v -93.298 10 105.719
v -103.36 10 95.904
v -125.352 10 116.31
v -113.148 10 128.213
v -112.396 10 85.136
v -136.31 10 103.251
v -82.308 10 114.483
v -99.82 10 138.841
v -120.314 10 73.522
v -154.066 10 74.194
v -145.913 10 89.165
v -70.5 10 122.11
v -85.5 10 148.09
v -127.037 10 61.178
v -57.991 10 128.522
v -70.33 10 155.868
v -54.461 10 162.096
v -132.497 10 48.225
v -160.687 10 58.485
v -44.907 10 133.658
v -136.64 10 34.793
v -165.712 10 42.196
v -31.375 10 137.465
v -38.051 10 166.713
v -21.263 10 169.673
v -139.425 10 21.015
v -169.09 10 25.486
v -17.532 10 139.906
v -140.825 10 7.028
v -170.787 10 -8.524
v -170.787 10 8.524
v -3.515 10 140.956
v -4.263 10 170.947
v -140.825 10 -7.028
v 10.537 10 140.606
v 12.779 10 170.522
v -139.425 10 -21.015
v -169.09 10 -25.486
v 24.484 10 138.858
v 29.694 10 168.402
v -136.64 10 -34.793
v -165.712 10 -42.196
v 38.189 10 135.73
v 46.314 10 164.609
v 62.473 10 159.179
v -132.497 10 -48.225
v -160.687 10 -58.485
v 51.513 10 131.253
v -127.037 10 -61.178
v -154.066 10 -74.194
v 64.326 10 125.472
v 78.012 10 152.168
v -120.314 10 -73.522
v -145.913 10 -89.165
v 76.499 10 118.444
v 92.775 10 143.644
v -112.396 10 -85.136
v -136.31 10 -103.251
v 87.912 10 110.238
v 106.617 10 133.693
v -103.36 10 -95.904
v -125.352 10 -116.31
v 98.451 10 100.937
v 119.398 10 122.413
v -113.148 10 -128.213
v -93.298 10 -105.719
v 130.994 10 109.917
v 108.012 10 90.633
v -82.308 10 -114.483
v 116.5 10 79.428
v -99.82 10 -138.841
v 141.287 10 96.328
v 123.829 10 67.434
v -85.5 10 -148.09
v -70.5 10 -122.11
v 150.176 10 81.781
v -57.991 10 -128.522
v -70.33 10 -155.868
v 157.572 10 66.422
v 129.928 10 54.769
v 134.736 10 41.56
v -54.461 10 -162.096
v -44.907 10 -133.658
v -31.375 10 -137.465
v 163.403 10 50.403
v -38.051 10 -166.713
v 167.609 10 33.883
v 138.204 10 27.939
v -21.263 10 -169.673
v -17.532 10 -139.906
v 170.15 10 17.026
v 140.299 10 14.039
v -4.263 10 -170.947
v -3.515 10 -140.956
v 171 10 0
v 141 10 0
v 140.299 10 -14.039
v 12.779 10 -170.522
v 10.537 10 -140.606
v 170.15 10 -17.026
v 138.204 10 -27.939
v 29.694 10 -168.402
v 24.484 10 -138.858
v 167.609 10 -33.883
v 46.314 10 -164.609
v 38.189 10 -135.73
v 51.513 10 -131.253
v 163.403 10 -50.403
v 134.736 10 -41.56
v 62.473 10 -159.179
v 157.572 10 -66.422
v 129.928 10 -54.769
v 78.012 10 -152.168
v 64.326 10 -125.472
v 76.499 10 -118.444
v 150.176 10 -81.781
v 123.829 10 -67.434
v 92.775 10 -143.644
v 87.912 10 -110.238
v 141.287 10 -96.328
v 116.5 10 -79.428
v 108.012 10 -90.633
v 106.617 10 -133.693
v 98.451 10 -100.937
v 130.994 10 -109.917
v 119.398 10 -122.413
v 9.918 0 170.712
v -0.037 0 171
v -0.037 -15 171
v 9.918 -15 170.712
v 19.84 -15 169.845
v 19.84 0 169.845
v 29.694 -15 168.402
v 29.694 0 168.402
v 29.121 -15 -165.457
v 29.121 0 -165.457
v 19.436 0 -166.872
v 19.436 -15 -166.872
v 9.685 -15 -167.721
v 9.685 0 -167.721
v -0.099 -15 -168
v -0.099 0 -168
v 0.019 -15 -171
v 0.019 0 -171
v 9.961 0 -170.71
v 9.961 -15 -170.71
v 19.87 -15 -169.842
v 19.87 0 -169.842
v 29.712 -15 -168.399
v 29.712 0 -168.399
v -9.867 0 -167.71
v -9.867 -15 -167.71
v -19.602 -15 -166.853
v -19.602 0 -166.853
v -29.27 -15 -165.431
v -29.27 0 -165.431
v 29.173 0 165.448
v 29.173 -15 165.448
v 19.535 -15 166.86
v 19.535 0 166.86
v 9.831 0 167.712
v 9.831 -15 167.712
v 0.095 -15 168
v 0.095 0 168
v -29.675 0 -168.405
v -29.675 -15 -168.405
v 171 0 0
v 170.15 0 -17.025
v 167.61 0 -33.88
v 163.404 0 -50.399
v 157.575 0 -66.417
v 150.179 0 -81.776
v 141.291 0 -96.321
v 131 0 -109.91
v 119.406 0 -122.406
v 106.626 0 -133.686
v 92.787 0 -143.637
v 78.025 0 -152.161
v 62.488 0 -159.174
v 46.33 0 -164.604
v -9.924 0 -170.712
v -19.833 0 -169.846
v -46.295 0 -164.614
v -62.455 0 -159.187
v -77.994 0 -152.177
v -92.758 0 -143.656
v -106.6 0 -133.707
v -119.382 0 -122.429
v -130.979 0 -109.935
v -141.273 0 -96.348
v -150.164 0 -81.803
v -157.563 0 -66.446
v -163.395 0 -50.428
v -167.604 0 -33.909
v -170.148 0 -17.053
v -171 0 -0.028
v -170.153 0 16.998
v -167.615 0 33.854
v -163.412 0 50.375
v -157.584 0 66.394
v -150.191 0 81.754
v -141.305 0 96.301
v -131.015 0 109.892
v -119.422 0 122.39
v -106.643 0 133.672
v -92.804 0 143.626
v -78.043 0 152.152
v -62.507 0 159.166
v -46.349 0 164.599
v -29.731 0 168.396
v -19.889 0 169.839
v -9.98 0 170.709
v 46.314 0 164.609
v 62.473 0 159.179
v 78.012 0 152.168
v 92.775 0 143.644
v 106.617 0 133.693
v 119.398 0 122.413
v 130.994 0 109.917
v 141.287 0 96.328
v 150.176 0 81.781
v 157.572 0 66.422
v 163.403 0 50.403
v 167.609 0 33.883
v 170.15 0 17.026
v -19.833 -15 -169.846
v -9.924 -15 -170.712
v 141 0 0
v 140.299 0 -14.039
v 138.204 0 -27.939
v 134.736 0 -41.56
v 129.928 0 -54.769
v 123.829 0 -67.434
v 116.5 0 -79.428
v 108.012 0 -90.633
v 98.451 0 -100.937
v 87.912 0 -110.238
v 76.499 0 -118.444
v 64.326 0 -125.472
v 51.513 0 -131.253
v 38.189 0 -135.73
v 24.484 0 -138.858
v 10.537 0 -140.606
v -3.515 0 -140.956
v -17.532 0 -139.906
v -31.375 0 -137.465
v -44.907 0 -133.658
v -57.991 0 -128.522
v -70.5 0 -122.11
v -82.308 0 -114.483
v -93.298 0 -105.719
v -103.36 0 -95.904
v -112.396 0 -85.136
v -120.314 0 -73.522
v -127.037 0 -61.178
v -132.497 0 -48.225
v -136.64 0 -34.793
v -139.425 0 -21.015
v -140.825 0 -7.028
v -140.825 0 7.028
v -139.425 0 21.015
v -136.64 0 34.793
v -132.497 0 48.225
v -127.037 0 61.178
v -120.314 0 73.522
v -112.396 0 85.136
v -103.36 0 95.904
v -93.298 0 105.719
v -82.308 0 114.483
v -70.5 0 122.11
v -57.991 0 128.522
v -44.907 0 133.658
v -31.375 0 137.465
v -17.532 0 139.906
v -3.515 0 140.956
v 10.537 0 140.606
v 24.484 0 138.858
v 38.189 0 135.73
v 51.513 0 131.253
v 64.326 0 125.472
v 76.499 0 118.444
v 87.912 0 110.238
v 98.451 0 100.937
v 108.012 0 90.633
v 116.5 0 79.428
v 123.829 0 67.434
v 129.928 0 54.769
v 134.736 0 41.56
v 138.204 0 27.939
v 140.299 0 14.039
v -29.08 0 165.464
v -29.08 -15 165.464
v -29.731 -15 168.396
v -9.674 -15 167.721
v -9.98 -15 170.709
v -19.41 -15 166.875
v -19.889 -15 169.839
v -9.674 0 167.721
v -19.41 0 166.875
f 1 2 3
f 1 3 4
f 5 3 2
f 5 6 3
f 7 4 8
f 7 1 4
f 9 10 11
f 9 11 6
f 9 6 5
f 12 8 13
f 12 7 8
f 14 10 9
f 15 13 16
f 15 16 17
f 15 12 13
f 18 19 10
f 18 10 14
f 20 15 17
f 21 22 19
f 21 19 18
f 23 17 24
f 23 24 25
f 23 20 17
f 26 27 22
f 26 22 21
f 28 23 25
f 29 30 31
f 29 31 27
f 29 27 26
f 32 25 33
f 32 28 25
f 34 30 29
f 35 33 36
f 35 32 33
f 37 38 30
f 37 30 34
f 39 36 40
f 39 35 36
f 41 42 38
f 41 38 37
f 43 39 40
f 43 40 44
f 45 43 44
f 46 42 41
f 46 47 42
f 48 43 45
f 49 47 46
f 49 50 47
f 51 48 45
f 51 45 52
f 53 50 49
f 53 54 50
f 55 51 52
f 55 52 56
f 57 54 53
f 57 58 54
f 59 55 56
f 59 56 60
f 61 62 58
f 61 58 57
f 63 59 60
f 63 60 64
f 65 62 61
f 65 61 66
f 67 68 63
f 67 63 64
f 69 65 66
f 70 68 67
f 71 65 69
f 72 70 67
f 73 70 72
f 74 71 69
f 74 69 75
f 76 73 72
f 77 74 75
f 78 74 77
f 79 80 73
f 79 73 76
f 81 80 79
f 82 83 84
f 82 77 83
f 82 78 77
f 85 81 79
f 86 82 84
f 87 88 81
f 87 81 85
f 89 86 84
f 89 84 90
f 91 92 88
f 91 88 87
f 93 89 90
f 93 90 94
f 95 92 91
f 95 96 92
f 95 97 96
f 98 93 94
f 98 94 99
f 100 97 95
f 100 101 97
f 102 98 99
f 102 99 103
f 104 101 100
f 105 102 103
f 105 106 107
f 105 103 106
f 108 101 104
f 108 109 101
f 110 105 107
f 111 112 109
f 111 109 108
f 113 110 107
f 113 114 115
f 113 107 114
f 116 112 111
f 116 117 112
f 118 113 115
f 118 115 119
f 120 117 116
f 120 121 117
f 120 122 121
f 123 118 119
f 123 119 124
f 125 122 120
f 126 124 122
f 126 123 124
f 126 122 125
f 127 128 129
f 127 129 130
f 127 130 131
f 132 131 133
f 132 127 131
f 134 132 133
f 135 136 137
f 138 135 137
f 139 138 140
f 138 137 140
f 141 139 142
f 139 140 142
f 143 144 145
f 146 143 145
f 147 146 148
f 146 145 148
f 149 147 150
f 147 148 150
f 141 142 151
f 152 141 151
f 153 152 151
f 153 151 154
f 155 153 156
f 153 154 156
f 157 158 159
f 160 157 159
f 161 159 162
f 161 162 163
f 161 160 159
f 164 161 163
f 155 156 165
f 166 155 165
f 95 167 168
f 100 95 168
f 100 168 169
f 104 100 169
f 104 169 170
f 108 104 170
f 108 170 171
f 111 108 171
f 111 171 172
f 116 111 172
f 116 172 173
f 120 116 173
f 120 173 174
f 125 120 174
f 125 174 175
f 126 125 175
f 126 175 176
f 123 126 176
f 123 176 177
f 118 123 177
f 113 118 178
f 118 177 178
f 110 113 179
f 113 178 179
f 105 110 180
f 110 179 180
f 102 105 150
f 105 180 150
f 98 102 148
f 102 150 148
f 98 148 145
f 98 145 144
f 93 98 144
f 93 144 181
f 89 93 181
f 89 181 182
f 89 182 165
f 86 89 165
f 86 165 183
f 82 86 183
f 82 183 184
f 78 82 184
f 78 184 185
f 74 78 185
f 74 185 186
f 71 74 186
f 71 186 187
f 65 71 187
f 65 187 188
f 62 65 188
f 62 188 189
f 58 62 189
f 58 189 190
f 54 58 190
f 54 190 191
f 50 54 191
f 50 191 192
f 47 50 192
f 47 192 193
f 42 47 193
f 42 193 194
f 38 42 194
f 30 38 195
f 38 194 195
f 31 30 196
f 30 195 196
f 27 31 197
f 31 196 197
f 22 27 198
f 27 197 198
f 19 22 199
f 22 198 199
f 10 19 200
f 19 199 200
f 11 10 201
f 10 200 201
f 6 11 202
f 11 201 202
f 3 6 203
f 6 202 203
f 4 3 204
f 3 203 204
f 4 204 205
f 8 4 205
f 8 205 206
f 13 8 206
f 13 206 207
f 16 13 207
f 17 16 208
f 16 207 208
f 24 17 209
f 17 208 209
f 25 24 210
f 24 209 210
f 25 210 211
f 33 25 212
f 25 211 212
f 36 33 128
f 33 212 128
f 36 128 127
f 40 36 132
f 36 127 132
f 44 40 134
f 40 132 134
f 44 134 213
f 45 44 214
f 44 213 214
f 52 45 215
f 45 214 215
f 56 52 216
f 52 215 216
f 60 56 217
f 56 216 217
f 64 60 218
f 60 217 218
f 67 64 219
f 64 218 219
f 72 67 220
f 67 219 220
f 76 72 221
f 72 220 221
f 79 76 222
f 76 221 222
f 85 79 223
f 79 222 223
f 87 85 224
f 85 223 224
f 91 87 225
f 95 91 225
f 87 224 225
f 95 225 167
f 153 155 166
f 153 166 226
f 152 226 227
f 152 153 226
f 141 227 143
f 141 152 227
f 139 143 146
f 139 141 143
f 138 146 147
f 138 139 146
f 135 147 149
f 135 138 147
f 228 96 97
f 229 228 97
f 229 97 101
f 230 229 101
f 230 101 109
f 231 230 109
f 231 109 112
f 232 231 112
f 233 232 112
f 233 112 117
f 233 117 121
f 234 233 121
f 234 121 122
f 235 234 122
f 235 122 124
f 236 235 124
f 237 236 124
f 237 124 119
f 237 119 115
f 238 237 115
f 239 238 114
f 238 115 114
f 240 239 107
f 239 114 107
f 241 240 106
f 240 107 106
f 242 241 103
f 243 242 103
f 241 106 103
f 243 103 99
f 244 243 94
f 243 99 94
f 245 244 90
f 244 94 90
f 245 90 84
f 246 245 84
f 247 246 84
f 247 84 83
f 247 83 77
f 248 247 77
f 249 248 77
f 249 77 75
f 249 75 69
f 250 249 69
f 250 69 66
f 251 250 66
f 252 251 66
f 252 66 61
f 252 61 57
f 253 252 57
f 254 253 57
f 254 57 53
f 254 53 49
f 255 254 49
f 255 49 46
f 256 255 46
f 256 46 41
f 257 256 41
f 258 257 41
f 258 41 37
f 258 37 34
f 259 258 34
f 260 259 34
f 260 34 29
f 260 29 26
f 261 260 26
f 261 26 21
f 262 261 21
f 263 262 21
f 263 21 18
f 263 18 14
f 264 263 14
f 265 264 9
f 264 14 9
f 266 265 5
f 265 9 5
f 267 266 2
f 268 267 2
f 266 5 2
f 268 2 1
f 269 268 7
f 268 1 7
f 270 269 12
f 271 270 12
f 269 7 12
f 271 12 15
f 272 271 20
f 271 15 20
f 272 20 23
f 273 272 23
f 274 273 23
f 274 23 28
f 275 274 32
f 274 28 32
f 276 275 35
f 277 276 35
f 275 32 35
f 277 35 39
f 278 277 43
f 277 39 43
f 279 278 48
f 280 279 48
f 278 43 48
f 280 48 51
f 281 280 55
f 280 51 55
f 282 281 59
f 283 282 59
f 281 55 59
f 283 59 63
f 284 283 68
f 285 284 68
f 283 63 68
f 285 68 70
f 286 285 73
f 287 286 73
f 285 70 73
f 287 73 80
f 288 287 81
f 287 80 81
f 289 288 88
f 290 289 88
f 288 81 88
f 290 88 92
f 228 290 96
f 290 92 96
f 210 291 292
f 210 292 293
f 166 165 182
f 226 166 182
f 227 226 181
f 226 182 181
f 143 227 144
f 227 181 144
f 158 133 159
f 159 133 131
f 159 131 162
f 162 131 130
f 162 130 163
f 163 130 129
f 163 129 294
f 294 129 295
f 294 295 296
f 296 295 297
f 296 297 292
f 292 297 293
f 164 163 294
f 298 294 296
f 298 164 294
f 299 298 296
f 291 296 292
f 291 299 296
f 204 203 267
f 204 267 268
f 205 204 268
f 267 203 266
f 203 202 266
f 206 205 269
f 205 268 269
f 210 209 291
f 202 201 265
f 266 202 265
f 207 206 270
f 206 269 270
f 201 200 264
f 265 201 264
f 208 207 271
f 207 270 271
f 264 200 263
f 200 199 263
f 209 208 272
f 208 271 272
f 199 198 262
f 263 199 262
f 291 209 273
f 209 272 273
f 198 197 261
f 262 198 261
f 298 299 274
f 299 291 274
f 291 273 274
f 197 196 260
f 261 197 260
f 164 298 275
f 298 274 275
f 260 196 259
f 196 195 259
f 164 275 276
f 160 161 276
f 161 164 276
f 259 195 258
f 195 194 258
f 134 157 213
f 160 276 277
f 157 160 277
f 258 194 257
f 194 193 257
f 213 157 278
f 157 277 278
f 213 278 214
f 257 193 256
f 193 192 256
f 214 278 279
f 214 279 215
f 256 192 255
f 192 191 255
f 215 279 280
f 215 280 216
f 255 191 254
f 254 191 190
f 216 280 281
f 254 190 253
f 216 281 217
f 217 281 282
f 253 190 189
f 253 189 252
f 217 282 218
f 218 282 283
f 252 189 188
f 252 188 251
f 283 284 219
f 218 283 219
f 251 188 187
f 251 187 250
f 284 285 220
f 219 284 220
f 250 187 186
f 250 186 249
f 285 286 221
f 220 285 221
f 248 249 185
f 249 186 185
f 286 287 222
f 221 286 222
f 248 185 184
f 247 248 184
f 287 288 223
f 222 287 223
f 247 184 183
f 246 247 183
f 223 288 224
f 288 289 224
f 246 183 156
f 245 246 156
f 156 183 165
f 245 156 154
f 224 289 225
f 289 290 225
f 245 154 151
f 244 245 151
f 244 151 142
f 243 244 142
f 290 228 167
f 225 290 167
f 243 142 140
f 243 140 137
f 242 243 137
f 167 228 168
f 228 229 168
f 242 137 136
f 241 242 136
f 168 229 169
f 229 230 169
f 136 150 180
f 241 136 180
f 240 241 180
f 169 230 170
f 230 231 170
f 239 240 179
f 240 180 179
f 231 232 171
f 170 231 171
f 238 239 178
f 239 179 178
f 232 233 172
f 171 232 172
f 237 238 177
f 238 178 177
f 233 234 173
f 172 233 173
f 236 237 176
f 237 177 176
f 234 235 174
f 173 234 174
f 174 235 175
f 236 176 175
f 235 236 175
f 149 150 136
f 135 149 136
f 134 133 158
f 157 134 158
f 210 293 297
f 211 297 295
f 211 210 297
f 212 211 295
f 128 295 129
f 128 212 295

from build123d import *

# Parameters (mm, degrees)
SKETCH1_R           = 171
BOSS_EXTRUDE1_DEPTH = 10
SKETCH2_R           = 141
CUT_EXTRUDE1_DEPTH  = 11
BOSS_EXTRUDE2_DEPTH = 15
BOSS_EXTRUDE3_DEPTH = 15


with BuildPart() as part:
    # Sketch1 → Boss-Extrude1 (new body)
    with BuildSketch(Plane(origin=(0, 0, 0), x_dir=(1, 0, 0), z_dir=(0, 1, 0))):
        Circle(SKETCH1_R)
    extrude(amount=BOSS_EXTRUDE1_DEPTH)

    # Sketch2 → Cut-Extrude1 (cut, through all)
    with BuildSketch(Plane(origin=(0, 10, 0), x_dir=(1, 0, 0), z_dir=(0, 1, 0))):
        Circle(SKETCH2_R)
    extrude(amount=-CUT_EXTRUDE1_DEPTH, mode=Mode.SUBTRACT)

    # Sketch3 → Boss-Extrude2 (add)
    with BuildSketch(Plane.XZ):
        with BuildLine():
            Line((29.693838381, 168.402125765), (29.172893848, 165.447702506))
            ThreePointArc((29.172893848, 165.447702506), (14.689274555, 167.356581027), (0.094580612, 167.999973377))
            ThreePointArc((0.094580612, 167.999973377), (-14.547941757, 167.368926001), (-29.079745505, 165.464100038))
            Line((-29.079745505, 165.464100038), (-29.730542301, 168.395649749))
            ThreePointArc((-29.730542301, 168.395649749), (-14.940760682, 170.346040959), (-0.037270853, 170.999995938))
            ThreePointArc((-0.037270853, 170.999995938), (14.885067408, 170.350916547), (29.693838381, 168.402125765))
        make_face()
    extrude(amount=BOSS_EXTRUDE2_DEPTH)

    # Sketch4 → Boss-Extrude3 (add)
    with BuildSketch(Plane.XZ):
        with BuildLine():
            Line((29.712190517, -168.398888757), (29.120639245, -165.456907894))
            ThreePointArc((29.120639245, -165.456907894), (14.566625791, -167.367300907), (-0.098592842, -167.99997107))
            ThreePointArc((-0.098592842, -167.99997107), (-14.740379926, -167.352087527), (-29.269983819, -165.430553548))
            Line((-29.269983819, -165.430553548), (-29.675485892, -168.405360773))
            ThreePointArc((-29.675485892, -168.405360773), (-14.885067408, -170.350916547), (0.018635427, -170.999998985))
            ThreePointArc((0.018635427, -170.999998985), (14.922196434, -170.347668178), (29.712190517, -168.398888757))
        make_face()
    extrude(amount=BOSS_EXTRUDE3_DEPTH)


solid = part.part
